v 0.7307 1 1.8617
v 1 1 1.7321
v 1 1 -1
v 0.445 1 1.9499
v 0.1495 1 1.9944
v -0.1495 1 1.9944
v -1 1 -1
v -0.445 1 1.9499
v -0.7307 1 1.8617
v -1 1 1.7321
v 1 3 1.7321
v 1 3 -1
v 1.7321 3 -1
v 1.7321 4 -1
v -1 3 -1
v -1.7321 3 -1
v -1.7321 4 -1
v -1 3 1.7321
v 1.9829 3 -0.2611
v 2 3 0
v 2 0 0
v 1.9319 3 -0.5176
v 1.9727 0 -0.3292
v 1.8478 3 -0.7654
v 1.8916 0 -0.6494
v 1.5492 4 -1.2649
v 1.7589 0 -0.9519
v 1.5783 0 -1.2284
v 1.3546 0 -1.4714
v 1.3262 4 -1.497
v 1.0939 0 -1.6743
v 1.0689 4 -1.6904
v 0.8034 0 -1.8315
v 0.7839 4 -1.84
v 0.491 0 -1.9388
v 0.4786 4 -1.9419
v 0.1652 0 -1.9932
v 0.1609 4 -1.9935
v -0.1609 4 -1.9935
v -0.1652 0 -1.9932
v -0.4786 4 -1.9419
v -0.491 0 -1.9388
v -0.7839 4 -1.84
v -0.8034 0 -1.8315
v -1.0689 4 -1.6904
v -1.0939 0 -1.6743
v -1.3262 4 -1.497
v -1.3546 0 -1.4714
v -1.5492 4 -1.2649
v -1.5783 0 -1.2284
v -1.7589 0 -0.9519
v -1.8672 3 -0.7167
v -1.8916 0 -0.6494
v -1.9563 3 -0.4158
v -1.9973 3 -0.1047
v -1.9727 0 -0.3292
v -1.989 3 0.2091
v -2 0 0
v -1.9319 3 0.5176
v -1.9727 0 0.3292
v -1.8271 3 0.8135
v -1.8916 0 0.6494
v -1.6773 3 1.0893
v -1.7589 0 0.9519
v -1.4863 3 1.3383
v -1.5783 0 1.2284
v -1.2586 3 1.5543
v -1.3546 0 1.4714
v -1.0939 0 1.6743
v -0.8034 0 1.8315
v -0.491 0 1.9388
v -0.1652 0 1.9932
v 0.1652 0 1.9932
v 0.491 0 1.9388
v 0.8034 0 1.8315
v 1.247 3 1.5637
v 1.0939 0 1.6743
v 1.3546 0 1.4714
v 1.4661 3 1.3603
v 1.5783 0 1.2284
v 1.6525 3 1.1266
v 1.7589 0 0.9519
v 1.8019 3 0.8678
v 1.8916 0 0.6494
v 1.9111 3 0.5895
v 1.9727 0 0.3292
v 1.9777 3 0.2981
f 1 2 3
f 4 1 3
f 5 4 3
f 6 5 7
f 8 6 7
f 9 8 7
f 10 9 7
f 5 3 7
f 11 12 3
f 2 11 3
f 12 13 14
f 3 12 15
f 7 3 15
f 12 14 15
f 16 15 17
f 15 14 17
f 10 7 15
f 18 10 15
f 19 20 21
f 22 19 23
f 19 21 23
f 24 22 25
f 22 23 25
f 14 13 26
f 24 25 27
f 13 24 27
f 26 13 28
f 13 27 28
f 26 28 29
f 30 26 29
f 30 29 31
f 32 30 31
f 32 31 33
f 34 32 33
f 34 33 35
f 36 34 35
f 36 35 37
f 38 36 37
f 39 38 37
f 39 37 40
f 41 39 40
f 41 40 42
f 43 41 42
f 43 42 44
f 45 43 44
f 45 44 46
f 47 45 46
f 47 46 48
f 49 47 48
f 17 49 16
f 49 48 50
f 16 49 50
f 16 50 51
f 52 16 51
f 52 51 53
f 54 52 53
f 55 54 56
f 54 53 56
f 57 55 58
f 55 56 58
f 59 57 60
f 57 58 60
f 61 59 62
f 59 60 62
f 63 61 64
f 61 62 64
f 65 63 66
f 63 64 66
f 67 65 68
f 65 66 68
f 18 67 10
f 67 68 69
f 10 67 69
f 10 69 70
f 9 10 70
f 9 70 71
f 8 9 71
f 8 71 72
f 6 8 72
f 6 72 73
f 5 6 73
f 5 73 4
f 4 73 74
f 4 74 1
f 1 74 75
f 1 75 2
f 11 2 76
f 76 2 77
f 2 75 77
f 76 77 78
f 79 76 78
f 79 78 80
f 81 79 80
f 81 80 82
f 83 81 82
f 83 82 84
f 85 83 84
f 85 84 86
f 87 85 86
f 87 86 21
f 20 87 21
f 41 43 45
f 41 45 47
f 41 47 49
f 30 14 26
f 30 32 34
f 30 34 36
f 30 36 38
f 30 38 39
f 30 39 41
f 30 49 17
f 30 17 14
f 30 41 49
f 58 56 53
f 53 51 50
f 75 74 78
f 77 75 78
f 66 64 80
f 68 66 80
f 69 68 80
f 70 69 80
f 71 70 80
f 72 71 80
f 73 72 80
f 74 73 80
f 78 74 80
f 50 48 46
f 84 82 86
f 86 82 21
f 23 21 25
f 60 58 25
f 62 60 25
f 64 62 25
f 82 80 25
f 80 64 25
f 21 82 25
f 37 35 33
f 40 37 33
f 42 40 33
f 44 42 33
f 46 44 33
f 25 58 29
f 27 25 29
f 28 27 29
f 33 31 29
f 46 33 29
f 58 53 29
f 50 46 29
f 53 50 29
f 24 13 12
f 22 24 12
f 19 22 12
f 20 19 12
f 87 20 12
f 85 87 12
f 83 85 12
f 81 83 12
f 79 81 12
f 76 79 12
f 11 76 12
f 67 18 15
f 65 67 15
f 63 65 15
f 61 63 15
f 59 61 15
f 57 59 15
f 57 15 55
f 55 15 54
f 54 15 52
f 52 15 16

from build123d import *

# Parameters (mm, degrees)
SKETCH1_R               = 2
BOSS_EXTRUDE1_DEPTH     = 4
CUT_EXTRUDE1_DEPTH      = 3
CUT_EXTRUDE1_DEPTH_BACK = 1


with BuildPart() as part:
    # Sketch1 → Boss-Extrude1 (new body)
    with BuildSketch(Plane(origin=(0, 0, 0), x_dir=(1, 0, 0), z_dir=(0, 1, 0))):
        Circle(SKETCH1_R)
    extrude(amount=BOSS_EXTRUDE1_DEPTH)

    # Sketch2 → Cut-Extrude1 (cut, two sides)
    with BuildSketch(Plane.XY) as cut_extrude1_sk:
        Polygon((-2, 4), (2, 4), (2, 3), (1, 3), (1, 1), (-1, 1), (-1, 3), (-2, 3), align=None)
    extrude(amount=CUT_EXTRUDE1_DEPTH, mode=Mode.SUBTRACT)
    extrude(cut_extrude1_sk.sketch, amount=-CUT_EXTRUDE1_DEPTH_BACK, mode=Mode.SUBTRACT)


solid = part.part
